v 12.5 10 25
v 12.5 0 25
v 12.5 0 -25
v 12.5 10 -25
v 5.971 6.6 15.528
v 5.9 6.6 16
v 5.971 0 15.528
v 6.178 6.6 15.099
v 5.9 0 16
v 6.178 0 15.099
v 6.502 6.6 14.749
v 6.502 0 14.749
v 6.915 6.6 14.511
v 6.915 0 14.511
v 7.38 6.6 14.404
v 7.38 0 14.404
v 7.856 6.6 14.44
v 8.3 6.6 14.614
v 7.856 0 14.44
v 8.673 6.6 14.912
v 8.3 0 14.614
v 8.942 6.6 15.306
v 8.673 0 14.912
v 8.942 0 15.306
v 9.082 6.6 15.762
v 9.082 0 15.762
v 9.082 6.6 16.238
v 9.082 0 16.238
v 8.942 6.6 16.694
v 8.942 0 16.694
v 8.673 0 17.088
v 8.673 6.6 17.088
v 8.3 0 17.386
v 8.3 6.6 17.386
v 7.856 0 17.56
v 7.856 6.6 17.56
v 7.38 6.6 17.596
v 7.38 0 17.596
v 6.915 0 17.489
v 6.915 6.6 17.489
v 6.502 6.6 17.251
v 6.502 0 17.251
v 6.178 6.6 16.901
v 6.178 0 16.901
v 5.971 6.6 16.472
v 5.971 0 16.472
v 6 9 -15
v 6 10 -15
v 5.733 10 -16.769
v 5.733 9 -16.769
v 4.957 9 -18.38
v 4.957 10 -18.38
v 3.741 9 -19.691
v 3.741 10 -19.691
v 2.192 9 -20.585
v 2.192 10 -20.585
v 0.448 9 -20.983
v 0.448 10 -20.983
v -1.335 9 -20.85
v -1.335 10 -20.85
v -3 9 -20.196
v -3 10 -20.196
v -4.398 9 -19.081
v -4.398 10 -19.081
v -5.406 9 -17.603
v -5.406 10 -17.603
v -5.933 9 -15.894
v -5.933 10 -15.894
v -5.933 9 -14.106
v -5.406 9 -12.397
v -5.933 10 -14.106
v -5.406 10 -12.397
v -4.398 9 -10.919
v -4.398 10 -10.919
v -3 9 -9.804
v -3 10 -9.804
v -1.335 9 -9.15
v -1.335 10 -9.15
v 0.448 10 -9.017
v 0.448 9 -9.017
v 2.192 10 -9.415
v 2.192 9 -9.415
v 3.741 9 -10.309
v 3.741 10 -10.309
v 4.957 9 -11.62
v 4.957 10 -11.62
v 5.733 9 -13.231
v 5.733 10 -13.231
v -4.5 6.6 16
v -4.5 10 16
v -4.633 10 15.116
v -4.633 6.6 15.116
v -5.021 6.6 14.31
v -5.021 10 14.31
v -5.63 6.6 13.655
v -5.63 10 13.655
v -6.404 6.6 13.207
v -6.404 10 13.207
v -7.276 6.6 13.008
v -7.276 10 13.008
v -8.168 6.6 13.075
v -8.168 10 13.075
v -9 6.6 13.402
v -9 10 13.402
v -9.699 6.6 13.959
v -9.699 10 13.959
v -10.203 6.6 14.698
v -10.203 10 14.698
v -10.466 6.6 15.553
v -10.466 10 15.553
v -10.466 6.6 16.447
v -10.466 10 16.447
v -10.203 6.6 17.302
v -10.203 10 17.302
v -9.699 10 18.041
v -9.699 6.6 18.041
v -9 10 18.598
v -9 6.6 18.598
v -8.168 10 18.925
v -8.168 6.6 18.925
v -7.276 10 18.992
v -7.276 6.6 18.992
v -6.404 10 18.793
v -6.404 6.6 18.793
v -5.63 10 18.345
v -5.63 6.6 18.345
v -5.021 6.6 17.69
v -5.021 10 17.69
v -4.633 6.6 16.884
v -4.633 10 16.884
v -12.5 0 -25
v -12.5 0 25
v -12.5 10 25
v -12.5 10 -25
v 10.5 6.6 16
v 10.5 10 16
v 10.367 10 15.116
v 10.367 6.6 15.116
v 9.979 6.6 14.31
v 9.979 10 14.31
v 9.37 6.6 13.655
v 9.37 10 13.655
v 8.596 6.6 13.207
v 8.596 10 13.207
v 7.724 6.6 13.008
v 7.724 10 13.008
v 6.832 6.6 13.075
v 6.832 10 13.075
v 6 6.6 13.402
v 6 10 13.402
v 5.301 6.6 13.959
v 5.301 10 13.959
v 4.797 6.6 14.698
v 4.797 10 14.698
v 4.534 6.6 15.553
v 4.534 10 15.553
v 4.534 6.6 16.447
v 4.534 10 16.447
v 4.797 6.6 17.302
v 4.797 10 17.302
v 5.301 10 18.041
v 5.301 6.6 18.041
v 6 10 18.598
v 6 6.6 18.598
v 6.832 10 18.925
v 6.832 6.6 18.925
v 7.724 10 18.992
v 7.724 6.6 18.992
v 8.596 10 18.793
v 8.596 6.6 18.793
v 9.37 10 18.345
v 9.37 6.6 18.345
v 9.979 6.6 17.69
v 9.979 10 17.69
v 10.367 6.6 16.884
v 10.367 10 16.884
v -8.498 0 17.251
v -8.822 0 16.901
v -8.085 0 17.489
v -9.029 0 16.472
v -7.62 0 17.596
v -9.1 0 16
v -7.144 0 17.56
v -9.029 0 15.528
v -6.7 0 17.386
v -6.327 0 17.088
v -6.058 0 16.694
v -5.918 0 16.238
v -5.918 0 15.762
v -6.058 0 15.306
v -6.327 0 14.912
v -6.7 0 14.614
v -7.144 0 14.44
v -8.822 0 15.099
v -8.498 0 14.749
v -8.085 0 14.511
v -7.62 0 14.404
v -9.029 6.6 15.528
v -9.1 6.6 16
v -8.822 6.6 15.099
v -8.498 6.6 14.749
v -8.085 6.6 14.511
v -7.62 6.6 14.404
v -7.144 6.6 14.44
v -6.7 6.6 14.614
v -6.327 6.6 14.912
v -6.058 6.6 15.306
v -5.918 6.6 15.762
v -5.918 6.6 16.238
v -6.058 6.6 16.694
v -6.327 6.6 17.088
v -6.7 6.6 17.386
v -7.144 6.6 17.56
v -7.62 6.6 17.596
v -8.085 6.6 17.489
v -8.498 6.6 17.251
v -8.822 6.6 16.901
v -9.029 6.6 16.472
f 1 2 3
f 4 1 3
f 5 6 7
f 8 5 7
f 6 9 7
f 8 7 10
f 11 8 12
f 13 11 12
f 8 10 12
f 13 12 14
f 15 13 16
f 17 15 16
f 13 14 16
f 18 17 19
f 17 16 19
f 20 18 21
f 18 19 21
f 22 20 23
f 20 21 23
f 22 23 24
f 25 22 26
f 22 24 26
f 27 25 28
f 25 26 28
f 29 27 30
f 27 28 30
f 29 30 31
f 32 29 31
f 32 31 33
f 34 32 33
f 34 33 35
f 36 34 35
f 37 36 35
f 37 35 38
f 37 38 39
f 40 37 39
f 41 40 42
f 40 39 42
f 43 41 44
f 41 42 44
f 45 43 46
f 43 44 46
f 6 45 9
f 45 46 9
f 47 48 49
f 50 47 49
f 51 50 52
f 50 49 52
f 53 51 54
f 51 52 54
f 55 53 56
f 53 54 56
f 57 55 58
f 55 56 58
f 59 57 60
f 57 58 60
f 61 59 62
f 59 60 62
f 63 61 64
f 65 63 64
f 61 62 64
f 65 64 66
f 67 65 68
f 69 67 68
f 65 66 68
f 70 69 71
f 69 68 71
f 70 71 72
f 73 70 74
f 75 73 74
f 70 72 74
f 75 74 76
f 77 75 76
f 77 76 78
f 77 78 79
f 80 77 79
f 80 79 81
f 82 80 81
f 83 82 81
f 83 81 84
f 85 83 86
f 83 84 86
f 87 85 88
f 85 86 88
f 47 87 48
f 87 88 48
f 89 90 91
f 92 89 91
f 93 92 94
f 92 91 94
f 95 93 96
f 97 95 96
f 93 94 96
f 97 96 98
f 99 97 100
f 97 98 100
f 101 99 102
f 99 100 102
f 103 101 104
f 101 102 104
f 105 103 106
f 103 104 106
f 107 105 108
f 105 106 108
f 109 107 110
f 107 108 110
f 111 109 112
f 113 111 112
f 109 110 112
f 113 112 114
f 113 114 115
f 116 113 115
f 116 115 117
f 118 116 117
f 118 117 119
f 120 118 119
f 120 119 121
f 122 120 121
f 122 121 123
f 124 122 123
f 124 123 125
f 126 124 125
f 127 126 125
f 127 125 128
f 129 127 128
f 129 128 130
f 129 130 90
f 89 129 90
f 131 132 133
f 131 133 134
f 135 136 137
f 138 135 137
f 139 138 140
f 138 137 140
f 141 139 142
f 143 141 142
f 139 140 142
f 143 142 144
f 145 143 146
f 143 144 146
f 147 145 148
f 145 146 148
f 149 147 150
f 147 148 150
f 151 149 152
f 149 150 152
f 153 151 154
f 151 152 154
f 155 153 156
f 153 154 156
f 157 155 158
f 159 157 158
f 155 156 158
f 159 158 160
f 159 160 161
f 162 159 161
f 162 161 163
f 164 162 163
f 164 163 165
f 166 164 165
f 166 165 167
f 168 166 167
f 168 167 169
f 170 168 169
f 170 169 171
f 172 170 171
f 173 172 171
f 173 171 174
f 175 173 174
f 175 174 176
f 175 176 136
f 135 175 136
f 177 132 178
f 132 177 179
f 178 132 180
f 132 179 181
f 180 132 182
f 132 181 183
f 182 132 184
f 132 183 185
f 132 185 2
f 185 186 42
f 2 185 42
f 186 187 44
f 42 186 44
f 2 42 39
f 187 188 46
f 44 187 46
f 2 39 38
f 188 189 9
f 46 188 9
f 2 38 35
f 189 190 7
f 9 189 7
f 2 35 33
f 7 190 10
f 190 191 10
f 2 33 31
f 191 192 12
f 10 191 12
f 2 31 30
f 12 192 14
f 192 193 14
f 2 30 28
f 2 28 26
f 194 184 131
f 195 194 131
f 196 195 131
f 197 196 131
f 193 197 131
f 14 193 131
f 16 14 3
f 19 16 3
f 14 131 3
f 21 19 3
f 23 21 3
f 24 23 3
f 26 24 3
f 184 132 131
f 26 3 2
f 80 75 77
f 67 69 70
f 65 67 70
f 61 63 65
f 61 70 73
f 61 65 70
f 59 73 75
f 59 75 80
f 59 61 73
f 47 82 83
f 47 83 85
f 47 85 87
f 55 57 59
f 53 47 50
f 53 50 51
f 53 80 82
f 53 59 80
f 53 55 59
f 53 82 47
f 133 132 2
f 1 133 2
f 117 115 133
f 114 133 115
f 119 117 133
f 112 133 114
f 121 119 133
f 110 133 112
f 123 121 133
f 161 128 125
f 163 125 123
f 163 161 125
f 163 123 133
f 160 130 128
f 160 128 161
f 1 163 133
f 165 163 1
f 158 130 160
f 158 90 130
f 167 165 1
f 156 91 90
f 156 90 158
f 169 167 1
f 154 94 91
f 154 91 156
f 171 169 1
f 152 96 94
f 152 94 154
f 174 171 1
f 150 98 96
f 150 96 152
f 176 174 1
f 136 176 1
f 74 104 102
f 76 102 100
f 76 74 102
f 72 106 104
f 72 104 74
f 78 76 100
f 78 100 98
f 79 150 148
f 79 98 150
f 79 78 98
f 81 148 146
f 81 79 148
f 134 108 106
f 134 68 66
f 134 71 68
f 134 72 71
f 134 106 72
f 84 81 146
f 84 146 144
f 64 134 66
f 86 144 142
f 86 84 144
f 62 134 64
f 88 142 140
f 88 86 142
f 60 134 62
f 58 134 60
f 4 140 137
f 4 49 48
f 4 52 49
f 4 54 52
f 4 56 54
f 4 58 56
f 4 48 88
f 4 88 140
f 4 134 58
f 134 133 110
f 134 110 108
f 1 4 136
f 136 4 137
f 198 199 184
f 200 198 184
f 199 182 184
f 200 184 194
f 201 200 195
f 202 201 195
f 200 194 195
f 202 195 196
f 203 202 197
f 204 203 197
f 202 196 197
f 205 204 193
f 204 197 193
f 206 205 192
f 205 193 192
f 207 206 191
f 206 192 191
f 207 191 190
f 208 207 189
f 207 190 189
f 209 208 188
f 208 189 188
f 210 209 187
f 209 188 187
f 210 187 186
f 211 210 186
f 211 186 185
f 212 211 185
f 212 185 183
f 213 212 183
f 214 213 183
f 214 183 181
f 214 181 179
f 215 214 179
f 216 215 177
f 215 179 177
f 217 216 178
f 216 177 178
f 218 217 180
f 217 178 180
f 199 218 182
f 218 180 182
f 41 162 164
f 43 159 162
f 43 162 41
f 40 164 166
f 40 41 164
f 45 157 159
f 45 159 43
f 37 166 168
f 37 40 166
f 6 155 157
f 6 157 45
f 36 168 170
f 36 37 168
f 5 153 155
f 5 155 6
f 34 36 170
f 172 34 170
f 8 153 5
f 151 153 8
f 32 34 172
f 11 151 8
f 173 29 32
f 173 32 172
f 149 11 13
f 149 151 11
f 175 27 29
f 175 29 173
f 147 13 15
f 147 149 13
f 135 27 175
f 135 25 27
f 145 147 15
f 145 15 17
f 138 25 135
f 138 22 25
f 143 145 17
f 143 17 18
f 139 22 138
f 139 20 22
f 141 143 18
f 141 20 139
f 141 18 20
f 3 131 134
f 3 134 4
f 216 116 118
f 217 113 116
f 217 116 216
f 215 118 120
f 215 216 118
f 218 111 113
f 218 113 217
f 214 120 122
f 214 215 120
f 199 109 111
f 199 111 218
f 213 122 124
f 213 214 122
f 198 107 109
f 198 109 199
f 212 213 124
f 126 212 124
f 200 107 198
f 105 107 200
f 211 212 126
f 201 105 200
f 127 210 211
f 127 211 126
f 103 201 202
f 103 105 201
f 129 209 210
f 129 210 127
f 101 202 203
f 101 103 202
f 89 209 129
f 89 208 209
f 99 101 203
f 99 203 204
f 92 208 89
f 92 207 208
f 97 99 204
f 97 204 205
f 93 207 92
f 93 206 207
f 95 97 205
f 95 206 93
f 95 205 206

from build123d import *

# Parameters (mm, degrees)
SKETCH_1_W                = 25
SKETCH_1_H                = 50
EXTRUDE_1_DEPTH           = 10
HOLE_WIZARD_1_D           = 3.2
HOLE_WIZARD_1_CBORE_D     = 6
HOLE_WIZARD_1_CBORE_DEPTH = 3.4
SKETCH_5_R                = 6
CUT_EXTRUDE_1_DEPTH       = 1


with BuildPart() as part:
    # 草图1 → 凸台-拉伸1 (new body)
    with BuildSketch(Plane(origin=(0, 0, 0), x_dir=(1, 0, 0), z_dir=(0, 1, 0))):
        Rectangle(SKETCH_1_W, SKETCH_1_H)
    extrude(amount=EXTRUDE_1_DEPTH)

    # 打孔尺寸(%根据)内六角圆柱头螺钉的类型1 (through all)
    with Locations(Plane(origin=(0, 10, 0), x_dir=(1, 0, 0), z_dir=(0, 1, 0))):
        with Locations((-7.5, -16), (7.5, -16)):
            CounterBoreHole(HOLE_WIZARD_1_D / 2, HOLE_WIZARD_1_CBORE_D / 2, HOLE_WIZARD_1_CBORE_DEPTH)

    # 草图5 → 切除-拉伸1 (cut)
    with BuildSketch(Plane(origin=(0, 10, 0), x_dir=(1, 0, 0), z_dir=(0, 1, 0))):
        with Locations((0, 15)):
            Circle(SKETCH_5_R)
    extrude(amount=-CUT_EXTRUDE_1_DEPTH, mode=Mode.SUBTRACT)


solid = part.part
